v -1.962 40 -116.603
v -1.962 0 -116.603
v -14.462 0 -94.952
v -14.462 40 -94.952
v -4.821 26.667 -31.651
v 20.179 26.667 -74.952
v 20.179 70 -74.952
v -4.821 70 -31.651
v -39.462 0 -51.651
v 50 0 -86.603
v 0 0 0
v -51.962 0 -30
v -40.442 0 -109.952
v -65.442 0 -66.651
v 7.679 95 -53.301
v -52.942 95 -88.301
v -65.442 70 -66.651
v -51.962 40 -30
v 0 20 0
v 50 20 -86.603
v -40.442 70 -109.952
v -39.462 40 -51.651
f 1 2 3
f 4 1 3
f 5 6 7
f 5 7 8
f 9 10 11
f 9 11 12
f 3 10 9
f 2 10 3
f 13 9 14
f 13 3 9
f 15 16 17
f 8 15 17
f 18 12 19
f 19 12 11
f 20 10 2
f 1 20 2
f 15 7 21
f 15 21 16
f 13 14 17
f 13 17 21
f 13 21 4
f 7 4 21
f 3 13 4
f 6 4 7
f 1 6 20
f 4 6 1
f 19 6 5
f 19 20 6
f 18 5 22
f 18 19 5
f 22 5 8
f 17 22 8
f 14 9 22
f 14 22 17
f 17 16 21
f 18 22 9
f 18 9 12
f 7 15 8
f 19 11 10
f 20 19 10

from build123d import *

# Parameters (mm, degrees)
EXTRUDE1_DEPTH     = 40
CUT_EXTRUDE1_DEPTH = 126.980762114
EXTRUDE2_DEPTH     = 70
EXTRUDE3_DEPTH     = 70


with BuildPart() as part:
    # Sketch1 → Extrude1 (new body)
    with BuildSketch(Plane(origin=(0, 0, 0), x_dir=(1, 0, 0), z_dir=(0, 1, 0))):
        Polygon((0, 0), (50, 86.602540378), (-1.961524227, 116.602540378), (-51.961524227, 30), align=None)
    extrude(amount=EXTRUDE1_DEPTH)

    # Sketch2 → Cut-Extrude1 (cut, through all)
    with BuildSketch(Plane(origin=(0, 0, 0), x_dir=(0.866025404, 0, 0.5), z_dir=(-0.5, 0, 0.866025404))):
        Polygon((0, 20), (-60, 40), (0, 40), align=None)
    extrude(amount=-CUT_EXTRUDE1_DEPTH, mode=Mode.SUBTRACT)

    # Sketch3 → Extrude2 (add)
    with BuildSketch(Plane(origin=(0, 0, 0), x_dir=(1, 0, 0), z_dir=(0, 1, 0))):
        Polygon((-65.442286341, 66.650635095), (-40.442286341, 109.951905284), (20.179491924, 74.951905284), (-4.820508076, 31.650635095), align=None)
    extrude(amount=EXTRUDE2_DEPTH)

    # Sketch4 → Extrude3 (add)
    with BuildSketch(Plane(origin=(-17.320508076, 0, -10), x_dir=(0.5, 0, -0.866025404), z_dir=(0.866025404, 0, 0.5))):
        Polygon((25, 70), (75, 70), (50, 95), align=None)
    extrude(amount=-EXTRUDE3_DEPTH)


solid = part.part
